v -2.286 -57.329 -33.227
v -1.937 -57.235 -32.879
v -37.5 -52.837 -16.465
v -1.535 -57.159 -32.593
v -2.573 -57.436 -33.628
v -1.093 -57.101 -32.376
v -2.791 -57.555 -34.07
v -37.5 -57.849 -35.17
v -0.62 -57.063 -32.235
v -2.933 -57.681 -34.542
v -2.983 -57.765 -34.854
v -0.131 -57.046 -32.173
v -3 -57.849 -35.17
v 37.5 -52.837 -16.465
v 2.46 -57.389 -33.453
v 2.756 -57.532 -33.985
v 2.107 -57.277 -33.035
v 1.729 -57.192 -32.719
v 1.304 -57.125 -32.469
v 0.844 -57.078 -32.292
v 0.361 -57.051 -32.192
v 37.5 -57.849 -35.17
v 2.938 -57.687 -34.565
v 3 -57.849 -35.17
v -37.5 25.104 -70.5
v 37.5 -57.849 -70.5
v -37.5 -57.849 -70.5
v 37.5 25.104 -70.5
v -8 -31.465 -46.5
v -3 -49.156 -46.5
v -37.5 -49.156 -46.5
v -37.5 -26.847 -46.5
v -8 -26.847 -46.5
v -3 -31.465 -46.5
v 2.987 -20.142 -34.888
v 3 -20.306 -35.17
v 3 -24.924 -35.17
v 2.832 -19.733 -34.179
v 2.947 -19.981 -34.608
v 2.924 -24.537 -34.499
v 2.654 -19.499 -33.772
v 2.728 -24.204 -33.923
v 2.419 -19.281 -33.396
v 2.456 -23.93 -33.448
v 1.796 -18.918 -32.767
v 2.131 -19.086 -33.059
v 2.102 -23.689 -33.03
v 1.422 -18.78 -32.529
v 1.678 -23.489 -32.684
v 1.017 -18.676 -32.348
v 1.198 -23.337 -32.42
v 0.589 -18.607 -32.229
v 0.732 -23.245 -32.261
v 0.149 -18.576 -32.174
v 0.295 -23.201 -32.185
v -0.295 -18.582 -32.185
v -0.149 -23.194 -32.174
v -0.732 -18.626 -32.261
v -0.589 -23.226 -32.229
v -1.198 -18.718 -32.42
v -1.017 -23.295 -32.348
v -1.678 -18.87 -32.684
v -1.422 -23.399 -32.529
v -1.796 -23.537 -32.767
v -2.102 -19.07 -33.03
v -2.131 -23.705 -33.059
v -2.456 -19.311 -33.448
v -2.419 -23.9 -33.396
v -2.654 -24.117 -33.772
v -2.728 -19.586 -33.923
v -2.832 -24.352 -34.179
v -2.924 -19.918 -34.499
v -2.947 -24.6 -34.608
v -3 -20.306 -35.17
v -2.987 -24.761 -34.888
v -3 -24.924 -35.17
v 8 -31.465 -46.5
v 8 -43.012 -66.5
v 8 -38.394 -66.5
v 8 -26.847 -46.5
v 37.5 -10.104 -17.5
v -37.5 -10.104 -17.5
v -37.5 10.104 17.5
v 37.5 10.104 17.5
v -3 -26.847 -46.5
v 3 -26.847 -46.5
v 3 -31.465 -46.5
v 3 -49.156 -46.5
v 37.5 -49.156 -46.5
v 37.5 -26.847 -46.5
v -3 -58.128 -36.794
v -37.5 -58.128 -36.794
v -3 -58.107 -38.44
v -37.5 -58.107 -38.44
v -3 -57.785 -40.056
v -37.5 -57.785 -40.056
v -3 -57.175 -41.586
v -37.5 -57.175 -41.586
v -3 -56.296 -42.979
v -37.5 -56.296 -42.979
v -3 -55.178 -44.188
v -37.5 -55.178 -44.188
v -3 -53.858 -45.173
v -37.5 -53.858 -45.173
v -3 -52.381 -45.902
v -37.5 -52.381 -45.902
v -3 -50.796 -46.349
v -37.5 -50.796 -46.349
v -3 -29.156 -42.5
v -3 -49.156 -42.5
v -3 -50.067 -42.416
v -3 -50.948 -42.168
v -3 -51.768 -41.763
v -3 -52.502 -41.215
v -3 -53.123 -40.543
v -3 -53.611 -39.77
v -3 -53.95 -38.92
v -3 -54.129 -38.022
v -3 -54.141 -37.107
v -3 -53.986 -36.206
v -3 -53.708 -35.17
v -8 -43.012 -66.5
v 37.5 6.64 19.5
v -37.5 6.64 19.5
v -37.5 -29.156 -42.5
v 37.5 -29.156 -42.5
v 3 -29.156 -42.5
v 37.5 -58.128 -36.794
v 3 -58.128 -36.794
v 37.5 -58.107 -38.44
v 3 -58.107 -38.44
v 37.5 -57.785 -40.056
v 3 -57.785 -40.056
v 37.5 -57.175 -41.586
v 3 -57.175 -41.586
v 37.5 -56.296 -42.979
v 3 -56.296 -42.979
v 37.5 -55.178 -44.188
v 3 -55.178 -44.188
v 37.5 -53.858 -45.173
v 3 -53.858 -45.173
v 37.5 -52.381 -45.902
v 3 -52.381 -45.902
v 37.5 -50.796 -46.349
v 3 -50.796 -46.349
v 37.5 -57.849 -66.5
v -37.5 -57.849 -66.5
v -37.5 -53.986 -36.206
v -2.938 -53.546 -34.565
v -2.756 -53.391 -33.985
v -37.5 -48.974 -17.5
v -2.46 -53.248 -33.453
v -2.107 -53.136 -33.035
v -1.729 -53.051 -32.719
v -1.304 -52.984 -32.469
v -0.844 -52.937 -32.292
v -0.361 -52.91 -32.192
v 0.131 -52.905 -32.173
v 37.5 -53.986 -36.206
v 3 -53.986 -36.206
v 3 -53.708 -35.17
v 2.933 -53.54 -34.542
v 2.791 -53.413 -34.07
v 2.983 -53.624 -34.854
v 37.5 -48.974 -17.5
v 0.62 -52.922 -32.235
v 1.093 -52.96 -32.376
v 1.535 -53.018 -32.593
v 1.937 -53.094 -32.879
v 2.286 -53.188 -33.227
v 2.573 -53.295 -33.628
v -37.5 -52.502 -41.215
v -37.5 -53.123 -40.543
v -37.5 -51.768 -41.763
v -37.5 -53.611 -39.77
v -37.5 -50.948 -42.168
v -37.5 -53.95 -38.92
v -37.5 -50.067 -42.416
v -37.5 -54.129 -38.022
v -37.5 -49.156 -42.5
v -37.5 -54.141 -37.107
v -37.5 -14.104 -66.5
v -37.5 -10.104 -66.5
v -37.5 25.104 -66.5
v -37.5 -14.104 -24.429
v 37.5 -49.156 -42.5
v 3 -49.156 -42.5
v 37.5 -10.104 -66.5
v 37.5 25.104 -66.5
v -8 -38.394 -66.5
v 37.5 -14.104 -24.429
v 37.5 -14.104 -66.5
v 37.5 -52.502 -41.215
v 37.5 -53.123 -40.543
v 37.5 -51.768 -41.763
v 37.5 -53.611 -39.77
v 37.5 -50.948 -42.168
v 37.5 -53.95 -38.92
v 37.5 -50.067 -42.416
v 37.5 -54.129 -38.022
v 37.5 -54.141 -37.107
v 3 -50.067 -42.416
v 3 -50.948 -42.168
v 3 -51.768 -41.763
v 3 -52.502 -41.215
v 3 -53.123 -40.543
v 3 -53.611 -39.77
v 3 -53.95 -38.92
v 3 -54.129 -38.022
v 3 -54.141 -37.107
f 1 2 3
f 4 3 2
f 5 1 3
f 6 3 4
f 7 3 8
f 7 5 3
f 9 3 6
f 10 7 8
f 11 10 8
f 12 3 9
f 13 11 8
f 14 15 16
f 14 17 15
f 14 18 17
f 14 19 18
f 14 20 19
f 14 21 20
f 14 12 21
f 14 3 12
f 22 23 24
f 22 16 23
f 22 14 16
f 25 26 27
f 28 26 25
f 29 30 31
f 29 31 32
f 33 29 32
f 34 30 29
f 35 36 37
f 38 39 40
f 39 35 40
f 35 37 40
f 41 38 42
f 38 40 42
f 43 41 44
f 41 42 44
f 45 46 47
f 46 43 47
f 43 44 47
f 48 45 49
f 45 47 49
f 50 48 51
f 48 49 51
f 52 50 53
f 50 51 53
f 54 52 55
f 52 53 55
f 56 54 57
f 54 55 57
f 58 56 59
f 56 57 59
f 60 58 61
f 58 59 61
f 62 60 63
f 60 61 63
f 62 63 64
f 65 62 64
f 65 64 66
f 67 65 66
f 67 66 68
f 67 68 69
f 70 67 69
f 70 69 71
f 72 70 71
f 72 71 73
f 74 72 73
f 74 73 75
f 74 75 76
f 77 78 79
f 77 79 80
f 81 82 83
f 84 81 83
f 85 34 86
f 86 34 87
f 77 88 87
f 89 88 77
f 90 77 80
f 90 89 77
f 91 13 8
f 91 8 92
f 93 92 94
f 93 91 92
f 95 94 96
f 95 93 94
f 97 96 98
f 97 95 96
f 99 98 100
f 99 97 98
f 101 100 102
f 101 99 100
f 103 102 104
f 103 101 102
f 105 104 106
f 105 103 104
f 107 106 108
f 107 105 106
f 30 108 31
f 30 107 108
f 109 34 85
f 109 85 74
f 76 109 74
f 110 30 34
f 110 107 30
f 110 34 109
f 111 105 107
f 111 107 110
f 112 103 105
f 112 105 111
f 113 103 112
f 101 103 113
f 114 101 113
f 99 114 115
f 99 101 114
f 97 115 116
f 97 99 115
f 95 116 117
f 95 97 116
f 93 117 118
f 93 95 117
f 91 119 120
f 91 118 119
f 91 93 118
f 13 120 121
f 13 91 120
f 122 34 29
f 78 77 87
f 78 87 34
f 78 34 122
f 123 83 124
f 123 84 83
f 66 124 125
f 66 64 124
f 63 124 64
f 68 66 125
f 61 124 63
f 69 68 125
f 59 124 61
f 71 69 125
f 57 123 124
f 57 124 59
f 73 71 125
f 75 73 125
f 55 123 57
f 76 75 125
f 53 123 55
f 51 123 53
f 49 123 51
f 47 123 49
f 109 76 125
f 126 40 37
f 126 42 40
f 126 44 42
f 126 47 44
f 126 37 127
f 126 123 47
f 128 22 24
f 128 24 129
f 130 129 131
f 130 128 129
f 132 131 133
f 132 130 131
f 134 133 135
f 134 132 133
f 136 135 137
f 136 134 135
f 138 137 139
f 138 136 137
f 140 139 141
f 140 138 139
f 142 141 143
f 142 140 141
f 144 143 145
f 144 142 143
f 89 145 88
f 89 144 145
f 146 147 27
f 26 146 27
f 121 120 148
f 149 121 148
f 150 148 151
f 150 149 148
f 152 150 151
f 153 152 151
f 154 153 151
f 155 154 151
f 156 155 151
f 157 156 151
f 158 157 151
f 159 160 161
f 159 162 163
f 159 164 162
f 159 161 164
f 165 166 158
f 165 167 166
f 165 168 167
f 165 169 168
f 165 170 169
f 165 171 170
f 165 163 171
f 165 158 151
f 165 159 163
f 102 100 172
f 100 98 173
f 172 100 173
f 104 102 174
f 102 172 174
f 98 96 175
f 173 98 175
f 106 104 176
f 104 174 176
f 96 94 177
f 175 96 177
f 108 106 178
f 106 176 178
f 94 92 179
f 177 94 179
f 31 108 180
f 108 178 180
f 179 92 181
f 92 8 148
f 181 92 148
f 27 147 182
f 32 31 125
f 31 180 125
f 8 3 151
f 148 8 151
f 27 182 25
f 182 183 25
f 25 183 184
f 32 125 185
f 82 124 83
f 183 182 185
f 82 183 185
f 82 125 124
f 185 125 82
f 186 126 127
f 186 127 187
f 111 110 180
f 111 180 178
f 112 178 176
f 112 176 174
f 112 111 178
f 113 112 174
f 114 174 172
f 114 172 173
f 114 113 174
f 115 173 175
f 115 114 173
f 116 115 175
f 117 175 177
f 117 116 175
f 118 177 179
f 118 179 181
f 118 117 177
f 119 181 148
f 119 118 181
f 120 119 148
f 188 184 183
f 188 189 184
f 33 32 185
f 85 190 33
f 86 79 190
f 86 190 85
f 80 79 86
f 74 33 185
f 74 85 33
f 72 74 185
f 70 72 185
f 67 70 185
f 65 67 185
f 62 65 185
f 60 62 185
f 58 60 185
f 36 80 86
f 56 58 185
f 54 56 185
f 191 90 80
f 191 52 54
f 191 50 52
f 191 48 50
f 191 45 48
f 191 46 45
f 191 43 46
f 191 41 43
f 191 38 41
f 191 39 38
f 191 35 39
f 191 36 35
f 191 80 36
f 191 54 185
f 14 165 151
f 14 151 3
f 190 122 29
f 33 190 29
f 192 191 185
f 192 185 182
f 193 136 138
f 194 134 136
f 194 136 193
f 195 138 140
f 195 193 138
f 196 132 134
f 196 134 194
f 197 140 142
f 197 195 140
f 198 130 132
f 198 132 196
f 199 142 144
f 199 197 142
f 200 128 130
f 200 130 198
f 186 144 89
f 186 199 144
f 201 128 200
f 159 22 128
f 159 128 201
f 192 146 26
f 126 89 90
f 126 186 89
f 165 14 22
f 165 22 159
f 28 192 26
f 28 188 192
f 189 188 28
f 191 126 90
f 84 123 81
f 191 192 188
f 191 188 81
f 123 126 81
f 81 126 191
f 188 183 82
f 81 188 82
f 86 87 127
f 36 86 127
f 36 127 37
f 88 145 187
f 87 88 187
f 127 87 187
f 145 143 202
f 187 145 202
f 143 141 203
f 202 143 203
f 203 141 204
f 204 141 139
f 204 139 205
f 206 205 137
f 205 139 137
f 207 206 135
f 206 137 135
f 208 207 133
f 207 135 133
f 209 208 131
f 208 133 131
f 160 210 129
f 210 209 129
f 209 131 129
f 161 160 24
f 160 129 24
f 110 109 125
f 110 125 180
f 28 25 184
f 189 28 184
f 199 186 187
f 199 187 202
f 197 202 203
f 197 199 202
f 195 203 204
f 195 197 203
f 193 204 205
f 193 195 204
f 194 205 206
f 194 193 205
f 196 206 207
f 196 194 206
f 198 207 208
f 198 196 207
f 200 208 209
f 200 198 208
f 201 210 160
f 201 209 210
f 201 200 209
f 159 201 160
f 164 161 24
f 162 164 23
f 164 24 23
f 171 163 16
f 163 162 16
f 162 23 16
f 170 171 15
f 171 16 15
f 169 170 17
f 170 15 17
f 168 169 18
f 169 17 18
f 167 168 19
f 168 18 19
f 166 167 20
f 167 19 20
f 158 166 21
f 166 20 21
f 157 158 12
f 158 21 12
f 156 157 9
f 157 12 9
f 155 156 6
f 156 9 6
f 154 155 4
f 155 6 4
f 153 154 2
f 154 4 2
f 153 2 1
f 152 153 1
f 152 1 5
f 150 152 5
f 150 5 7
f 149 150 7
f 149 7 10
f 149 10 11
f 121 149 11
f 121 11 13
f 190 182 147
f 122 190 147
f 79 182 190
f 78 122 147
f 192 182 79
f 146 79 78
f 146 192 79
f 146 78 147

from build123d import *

# Parameters (mm, degrees)
F1_DEPTH      = 37.5
F2_W          = 29.5
F2_H          = 20
F2_W_2        = 6
F2_H_2        = 11.3293714059
F3_DEPTH      = 43.7455051422
F3_DEPTH_BACK = 2


with BuildPart() as f1:
    # F0 (on Right) → F1 (new body, symmetric)
    with BuildSketch(Plane.YZ):
        with BuildLine():
            ThreePointArc((-49.1559958296, -42.4996678599), (-53.122762531, -40.5434750049), (-53.985624961, -36.2055726343))
            Line((-53.985624961, -36.2055726343), (-48.9735712256, -17.5003334434))
            Line((-48.9735712256, -17.5003334434), (-52.8372736915, -16.4650574879))
            Line((-52.8372736915, -16.4650574879), (-57.8493273667, -35.1702964539))
            ThreePointArc((-57.8493273667, -35.1702964539), (-56.2961749927, -42.9785207209), (-49.1559949301, -46.4996678599))
            Line((-49.1559949301, -46.4996678599), (-31.4653969064, -46.4996678599))
            Line((-31.4653969064, -46.4996678599), (-43.0124022901, -66.4996678599))
            Line((-43.0124022901, -66.4996678599), (-57.8493273667, -66.4996678599))
            Line((-57.8493273667, -66.4996678599), (-57.8493273667, -70.499666991))
            Line((-57.8493273667, -70.499666991), (25.1038222245, -70.499666991))
            Line((25.1038222245, -70.499666991), (25.1038222245, -66.4996678599))
            Line((25.1038222245, -66.4996678599), (-10.1038222245, -66.4996678599))
            Line((-10.1038222245, -66.4996678599), (-10.1038222245, -17.5003334434))
            Line((-10.1038222245, -17.5003334434), (10.1038222245, 17.5003334434))
            Line((10.1038222245, 17.5003334434), (6.6397213618, 19.500333009))
            Line((6.6397213618, 19.500333009), (-29.1559958296, -42.4996678599))
            Line((-29.1559958296, -42.4996678599), (-49.1559958296, -42.4996678599))
        make_face()
        Polygon((-14.1038222245, -66.4996678599), (-38.3936011399, -66.4996678599), (-14.1038222245, -24.4285366737), align=None, mode=Mode.SUBTRACT)
    extrude(amount=F1_DEPTH, both=True)

    # F2 (on face) → F3 (cut, two sides)
    with BuildSketch(Plane.XZ.offset(57.8493273667)) as f3_sk:
        with Locations((-22.75, -56.4996678599)):
            Rectangle(F2_W, F2_H)
        with Locations((22.75, -56.4996678599)):
            Rectangle(F2_W, F2_H)
        with Locations((0, -40.8349821569)):
            Rectangle(F2_W_2, F2_H_2)
        with BuildLine():
            Line((-3, -35.1702964539), (3, -35.1702964539))
            ThreePointArc((3, -35.1702964539), (0, -32.1702964539), (-3, -35.1702964539))
        make_face()
    extrude(amount=-F3_DEPTH, mode=Mode.SUBTRACT)
    extrude(f3_sk.sketch, amount=F3_DEPTH_BACK, mode=Mode.SUBTRACT)


solid = f1.part
